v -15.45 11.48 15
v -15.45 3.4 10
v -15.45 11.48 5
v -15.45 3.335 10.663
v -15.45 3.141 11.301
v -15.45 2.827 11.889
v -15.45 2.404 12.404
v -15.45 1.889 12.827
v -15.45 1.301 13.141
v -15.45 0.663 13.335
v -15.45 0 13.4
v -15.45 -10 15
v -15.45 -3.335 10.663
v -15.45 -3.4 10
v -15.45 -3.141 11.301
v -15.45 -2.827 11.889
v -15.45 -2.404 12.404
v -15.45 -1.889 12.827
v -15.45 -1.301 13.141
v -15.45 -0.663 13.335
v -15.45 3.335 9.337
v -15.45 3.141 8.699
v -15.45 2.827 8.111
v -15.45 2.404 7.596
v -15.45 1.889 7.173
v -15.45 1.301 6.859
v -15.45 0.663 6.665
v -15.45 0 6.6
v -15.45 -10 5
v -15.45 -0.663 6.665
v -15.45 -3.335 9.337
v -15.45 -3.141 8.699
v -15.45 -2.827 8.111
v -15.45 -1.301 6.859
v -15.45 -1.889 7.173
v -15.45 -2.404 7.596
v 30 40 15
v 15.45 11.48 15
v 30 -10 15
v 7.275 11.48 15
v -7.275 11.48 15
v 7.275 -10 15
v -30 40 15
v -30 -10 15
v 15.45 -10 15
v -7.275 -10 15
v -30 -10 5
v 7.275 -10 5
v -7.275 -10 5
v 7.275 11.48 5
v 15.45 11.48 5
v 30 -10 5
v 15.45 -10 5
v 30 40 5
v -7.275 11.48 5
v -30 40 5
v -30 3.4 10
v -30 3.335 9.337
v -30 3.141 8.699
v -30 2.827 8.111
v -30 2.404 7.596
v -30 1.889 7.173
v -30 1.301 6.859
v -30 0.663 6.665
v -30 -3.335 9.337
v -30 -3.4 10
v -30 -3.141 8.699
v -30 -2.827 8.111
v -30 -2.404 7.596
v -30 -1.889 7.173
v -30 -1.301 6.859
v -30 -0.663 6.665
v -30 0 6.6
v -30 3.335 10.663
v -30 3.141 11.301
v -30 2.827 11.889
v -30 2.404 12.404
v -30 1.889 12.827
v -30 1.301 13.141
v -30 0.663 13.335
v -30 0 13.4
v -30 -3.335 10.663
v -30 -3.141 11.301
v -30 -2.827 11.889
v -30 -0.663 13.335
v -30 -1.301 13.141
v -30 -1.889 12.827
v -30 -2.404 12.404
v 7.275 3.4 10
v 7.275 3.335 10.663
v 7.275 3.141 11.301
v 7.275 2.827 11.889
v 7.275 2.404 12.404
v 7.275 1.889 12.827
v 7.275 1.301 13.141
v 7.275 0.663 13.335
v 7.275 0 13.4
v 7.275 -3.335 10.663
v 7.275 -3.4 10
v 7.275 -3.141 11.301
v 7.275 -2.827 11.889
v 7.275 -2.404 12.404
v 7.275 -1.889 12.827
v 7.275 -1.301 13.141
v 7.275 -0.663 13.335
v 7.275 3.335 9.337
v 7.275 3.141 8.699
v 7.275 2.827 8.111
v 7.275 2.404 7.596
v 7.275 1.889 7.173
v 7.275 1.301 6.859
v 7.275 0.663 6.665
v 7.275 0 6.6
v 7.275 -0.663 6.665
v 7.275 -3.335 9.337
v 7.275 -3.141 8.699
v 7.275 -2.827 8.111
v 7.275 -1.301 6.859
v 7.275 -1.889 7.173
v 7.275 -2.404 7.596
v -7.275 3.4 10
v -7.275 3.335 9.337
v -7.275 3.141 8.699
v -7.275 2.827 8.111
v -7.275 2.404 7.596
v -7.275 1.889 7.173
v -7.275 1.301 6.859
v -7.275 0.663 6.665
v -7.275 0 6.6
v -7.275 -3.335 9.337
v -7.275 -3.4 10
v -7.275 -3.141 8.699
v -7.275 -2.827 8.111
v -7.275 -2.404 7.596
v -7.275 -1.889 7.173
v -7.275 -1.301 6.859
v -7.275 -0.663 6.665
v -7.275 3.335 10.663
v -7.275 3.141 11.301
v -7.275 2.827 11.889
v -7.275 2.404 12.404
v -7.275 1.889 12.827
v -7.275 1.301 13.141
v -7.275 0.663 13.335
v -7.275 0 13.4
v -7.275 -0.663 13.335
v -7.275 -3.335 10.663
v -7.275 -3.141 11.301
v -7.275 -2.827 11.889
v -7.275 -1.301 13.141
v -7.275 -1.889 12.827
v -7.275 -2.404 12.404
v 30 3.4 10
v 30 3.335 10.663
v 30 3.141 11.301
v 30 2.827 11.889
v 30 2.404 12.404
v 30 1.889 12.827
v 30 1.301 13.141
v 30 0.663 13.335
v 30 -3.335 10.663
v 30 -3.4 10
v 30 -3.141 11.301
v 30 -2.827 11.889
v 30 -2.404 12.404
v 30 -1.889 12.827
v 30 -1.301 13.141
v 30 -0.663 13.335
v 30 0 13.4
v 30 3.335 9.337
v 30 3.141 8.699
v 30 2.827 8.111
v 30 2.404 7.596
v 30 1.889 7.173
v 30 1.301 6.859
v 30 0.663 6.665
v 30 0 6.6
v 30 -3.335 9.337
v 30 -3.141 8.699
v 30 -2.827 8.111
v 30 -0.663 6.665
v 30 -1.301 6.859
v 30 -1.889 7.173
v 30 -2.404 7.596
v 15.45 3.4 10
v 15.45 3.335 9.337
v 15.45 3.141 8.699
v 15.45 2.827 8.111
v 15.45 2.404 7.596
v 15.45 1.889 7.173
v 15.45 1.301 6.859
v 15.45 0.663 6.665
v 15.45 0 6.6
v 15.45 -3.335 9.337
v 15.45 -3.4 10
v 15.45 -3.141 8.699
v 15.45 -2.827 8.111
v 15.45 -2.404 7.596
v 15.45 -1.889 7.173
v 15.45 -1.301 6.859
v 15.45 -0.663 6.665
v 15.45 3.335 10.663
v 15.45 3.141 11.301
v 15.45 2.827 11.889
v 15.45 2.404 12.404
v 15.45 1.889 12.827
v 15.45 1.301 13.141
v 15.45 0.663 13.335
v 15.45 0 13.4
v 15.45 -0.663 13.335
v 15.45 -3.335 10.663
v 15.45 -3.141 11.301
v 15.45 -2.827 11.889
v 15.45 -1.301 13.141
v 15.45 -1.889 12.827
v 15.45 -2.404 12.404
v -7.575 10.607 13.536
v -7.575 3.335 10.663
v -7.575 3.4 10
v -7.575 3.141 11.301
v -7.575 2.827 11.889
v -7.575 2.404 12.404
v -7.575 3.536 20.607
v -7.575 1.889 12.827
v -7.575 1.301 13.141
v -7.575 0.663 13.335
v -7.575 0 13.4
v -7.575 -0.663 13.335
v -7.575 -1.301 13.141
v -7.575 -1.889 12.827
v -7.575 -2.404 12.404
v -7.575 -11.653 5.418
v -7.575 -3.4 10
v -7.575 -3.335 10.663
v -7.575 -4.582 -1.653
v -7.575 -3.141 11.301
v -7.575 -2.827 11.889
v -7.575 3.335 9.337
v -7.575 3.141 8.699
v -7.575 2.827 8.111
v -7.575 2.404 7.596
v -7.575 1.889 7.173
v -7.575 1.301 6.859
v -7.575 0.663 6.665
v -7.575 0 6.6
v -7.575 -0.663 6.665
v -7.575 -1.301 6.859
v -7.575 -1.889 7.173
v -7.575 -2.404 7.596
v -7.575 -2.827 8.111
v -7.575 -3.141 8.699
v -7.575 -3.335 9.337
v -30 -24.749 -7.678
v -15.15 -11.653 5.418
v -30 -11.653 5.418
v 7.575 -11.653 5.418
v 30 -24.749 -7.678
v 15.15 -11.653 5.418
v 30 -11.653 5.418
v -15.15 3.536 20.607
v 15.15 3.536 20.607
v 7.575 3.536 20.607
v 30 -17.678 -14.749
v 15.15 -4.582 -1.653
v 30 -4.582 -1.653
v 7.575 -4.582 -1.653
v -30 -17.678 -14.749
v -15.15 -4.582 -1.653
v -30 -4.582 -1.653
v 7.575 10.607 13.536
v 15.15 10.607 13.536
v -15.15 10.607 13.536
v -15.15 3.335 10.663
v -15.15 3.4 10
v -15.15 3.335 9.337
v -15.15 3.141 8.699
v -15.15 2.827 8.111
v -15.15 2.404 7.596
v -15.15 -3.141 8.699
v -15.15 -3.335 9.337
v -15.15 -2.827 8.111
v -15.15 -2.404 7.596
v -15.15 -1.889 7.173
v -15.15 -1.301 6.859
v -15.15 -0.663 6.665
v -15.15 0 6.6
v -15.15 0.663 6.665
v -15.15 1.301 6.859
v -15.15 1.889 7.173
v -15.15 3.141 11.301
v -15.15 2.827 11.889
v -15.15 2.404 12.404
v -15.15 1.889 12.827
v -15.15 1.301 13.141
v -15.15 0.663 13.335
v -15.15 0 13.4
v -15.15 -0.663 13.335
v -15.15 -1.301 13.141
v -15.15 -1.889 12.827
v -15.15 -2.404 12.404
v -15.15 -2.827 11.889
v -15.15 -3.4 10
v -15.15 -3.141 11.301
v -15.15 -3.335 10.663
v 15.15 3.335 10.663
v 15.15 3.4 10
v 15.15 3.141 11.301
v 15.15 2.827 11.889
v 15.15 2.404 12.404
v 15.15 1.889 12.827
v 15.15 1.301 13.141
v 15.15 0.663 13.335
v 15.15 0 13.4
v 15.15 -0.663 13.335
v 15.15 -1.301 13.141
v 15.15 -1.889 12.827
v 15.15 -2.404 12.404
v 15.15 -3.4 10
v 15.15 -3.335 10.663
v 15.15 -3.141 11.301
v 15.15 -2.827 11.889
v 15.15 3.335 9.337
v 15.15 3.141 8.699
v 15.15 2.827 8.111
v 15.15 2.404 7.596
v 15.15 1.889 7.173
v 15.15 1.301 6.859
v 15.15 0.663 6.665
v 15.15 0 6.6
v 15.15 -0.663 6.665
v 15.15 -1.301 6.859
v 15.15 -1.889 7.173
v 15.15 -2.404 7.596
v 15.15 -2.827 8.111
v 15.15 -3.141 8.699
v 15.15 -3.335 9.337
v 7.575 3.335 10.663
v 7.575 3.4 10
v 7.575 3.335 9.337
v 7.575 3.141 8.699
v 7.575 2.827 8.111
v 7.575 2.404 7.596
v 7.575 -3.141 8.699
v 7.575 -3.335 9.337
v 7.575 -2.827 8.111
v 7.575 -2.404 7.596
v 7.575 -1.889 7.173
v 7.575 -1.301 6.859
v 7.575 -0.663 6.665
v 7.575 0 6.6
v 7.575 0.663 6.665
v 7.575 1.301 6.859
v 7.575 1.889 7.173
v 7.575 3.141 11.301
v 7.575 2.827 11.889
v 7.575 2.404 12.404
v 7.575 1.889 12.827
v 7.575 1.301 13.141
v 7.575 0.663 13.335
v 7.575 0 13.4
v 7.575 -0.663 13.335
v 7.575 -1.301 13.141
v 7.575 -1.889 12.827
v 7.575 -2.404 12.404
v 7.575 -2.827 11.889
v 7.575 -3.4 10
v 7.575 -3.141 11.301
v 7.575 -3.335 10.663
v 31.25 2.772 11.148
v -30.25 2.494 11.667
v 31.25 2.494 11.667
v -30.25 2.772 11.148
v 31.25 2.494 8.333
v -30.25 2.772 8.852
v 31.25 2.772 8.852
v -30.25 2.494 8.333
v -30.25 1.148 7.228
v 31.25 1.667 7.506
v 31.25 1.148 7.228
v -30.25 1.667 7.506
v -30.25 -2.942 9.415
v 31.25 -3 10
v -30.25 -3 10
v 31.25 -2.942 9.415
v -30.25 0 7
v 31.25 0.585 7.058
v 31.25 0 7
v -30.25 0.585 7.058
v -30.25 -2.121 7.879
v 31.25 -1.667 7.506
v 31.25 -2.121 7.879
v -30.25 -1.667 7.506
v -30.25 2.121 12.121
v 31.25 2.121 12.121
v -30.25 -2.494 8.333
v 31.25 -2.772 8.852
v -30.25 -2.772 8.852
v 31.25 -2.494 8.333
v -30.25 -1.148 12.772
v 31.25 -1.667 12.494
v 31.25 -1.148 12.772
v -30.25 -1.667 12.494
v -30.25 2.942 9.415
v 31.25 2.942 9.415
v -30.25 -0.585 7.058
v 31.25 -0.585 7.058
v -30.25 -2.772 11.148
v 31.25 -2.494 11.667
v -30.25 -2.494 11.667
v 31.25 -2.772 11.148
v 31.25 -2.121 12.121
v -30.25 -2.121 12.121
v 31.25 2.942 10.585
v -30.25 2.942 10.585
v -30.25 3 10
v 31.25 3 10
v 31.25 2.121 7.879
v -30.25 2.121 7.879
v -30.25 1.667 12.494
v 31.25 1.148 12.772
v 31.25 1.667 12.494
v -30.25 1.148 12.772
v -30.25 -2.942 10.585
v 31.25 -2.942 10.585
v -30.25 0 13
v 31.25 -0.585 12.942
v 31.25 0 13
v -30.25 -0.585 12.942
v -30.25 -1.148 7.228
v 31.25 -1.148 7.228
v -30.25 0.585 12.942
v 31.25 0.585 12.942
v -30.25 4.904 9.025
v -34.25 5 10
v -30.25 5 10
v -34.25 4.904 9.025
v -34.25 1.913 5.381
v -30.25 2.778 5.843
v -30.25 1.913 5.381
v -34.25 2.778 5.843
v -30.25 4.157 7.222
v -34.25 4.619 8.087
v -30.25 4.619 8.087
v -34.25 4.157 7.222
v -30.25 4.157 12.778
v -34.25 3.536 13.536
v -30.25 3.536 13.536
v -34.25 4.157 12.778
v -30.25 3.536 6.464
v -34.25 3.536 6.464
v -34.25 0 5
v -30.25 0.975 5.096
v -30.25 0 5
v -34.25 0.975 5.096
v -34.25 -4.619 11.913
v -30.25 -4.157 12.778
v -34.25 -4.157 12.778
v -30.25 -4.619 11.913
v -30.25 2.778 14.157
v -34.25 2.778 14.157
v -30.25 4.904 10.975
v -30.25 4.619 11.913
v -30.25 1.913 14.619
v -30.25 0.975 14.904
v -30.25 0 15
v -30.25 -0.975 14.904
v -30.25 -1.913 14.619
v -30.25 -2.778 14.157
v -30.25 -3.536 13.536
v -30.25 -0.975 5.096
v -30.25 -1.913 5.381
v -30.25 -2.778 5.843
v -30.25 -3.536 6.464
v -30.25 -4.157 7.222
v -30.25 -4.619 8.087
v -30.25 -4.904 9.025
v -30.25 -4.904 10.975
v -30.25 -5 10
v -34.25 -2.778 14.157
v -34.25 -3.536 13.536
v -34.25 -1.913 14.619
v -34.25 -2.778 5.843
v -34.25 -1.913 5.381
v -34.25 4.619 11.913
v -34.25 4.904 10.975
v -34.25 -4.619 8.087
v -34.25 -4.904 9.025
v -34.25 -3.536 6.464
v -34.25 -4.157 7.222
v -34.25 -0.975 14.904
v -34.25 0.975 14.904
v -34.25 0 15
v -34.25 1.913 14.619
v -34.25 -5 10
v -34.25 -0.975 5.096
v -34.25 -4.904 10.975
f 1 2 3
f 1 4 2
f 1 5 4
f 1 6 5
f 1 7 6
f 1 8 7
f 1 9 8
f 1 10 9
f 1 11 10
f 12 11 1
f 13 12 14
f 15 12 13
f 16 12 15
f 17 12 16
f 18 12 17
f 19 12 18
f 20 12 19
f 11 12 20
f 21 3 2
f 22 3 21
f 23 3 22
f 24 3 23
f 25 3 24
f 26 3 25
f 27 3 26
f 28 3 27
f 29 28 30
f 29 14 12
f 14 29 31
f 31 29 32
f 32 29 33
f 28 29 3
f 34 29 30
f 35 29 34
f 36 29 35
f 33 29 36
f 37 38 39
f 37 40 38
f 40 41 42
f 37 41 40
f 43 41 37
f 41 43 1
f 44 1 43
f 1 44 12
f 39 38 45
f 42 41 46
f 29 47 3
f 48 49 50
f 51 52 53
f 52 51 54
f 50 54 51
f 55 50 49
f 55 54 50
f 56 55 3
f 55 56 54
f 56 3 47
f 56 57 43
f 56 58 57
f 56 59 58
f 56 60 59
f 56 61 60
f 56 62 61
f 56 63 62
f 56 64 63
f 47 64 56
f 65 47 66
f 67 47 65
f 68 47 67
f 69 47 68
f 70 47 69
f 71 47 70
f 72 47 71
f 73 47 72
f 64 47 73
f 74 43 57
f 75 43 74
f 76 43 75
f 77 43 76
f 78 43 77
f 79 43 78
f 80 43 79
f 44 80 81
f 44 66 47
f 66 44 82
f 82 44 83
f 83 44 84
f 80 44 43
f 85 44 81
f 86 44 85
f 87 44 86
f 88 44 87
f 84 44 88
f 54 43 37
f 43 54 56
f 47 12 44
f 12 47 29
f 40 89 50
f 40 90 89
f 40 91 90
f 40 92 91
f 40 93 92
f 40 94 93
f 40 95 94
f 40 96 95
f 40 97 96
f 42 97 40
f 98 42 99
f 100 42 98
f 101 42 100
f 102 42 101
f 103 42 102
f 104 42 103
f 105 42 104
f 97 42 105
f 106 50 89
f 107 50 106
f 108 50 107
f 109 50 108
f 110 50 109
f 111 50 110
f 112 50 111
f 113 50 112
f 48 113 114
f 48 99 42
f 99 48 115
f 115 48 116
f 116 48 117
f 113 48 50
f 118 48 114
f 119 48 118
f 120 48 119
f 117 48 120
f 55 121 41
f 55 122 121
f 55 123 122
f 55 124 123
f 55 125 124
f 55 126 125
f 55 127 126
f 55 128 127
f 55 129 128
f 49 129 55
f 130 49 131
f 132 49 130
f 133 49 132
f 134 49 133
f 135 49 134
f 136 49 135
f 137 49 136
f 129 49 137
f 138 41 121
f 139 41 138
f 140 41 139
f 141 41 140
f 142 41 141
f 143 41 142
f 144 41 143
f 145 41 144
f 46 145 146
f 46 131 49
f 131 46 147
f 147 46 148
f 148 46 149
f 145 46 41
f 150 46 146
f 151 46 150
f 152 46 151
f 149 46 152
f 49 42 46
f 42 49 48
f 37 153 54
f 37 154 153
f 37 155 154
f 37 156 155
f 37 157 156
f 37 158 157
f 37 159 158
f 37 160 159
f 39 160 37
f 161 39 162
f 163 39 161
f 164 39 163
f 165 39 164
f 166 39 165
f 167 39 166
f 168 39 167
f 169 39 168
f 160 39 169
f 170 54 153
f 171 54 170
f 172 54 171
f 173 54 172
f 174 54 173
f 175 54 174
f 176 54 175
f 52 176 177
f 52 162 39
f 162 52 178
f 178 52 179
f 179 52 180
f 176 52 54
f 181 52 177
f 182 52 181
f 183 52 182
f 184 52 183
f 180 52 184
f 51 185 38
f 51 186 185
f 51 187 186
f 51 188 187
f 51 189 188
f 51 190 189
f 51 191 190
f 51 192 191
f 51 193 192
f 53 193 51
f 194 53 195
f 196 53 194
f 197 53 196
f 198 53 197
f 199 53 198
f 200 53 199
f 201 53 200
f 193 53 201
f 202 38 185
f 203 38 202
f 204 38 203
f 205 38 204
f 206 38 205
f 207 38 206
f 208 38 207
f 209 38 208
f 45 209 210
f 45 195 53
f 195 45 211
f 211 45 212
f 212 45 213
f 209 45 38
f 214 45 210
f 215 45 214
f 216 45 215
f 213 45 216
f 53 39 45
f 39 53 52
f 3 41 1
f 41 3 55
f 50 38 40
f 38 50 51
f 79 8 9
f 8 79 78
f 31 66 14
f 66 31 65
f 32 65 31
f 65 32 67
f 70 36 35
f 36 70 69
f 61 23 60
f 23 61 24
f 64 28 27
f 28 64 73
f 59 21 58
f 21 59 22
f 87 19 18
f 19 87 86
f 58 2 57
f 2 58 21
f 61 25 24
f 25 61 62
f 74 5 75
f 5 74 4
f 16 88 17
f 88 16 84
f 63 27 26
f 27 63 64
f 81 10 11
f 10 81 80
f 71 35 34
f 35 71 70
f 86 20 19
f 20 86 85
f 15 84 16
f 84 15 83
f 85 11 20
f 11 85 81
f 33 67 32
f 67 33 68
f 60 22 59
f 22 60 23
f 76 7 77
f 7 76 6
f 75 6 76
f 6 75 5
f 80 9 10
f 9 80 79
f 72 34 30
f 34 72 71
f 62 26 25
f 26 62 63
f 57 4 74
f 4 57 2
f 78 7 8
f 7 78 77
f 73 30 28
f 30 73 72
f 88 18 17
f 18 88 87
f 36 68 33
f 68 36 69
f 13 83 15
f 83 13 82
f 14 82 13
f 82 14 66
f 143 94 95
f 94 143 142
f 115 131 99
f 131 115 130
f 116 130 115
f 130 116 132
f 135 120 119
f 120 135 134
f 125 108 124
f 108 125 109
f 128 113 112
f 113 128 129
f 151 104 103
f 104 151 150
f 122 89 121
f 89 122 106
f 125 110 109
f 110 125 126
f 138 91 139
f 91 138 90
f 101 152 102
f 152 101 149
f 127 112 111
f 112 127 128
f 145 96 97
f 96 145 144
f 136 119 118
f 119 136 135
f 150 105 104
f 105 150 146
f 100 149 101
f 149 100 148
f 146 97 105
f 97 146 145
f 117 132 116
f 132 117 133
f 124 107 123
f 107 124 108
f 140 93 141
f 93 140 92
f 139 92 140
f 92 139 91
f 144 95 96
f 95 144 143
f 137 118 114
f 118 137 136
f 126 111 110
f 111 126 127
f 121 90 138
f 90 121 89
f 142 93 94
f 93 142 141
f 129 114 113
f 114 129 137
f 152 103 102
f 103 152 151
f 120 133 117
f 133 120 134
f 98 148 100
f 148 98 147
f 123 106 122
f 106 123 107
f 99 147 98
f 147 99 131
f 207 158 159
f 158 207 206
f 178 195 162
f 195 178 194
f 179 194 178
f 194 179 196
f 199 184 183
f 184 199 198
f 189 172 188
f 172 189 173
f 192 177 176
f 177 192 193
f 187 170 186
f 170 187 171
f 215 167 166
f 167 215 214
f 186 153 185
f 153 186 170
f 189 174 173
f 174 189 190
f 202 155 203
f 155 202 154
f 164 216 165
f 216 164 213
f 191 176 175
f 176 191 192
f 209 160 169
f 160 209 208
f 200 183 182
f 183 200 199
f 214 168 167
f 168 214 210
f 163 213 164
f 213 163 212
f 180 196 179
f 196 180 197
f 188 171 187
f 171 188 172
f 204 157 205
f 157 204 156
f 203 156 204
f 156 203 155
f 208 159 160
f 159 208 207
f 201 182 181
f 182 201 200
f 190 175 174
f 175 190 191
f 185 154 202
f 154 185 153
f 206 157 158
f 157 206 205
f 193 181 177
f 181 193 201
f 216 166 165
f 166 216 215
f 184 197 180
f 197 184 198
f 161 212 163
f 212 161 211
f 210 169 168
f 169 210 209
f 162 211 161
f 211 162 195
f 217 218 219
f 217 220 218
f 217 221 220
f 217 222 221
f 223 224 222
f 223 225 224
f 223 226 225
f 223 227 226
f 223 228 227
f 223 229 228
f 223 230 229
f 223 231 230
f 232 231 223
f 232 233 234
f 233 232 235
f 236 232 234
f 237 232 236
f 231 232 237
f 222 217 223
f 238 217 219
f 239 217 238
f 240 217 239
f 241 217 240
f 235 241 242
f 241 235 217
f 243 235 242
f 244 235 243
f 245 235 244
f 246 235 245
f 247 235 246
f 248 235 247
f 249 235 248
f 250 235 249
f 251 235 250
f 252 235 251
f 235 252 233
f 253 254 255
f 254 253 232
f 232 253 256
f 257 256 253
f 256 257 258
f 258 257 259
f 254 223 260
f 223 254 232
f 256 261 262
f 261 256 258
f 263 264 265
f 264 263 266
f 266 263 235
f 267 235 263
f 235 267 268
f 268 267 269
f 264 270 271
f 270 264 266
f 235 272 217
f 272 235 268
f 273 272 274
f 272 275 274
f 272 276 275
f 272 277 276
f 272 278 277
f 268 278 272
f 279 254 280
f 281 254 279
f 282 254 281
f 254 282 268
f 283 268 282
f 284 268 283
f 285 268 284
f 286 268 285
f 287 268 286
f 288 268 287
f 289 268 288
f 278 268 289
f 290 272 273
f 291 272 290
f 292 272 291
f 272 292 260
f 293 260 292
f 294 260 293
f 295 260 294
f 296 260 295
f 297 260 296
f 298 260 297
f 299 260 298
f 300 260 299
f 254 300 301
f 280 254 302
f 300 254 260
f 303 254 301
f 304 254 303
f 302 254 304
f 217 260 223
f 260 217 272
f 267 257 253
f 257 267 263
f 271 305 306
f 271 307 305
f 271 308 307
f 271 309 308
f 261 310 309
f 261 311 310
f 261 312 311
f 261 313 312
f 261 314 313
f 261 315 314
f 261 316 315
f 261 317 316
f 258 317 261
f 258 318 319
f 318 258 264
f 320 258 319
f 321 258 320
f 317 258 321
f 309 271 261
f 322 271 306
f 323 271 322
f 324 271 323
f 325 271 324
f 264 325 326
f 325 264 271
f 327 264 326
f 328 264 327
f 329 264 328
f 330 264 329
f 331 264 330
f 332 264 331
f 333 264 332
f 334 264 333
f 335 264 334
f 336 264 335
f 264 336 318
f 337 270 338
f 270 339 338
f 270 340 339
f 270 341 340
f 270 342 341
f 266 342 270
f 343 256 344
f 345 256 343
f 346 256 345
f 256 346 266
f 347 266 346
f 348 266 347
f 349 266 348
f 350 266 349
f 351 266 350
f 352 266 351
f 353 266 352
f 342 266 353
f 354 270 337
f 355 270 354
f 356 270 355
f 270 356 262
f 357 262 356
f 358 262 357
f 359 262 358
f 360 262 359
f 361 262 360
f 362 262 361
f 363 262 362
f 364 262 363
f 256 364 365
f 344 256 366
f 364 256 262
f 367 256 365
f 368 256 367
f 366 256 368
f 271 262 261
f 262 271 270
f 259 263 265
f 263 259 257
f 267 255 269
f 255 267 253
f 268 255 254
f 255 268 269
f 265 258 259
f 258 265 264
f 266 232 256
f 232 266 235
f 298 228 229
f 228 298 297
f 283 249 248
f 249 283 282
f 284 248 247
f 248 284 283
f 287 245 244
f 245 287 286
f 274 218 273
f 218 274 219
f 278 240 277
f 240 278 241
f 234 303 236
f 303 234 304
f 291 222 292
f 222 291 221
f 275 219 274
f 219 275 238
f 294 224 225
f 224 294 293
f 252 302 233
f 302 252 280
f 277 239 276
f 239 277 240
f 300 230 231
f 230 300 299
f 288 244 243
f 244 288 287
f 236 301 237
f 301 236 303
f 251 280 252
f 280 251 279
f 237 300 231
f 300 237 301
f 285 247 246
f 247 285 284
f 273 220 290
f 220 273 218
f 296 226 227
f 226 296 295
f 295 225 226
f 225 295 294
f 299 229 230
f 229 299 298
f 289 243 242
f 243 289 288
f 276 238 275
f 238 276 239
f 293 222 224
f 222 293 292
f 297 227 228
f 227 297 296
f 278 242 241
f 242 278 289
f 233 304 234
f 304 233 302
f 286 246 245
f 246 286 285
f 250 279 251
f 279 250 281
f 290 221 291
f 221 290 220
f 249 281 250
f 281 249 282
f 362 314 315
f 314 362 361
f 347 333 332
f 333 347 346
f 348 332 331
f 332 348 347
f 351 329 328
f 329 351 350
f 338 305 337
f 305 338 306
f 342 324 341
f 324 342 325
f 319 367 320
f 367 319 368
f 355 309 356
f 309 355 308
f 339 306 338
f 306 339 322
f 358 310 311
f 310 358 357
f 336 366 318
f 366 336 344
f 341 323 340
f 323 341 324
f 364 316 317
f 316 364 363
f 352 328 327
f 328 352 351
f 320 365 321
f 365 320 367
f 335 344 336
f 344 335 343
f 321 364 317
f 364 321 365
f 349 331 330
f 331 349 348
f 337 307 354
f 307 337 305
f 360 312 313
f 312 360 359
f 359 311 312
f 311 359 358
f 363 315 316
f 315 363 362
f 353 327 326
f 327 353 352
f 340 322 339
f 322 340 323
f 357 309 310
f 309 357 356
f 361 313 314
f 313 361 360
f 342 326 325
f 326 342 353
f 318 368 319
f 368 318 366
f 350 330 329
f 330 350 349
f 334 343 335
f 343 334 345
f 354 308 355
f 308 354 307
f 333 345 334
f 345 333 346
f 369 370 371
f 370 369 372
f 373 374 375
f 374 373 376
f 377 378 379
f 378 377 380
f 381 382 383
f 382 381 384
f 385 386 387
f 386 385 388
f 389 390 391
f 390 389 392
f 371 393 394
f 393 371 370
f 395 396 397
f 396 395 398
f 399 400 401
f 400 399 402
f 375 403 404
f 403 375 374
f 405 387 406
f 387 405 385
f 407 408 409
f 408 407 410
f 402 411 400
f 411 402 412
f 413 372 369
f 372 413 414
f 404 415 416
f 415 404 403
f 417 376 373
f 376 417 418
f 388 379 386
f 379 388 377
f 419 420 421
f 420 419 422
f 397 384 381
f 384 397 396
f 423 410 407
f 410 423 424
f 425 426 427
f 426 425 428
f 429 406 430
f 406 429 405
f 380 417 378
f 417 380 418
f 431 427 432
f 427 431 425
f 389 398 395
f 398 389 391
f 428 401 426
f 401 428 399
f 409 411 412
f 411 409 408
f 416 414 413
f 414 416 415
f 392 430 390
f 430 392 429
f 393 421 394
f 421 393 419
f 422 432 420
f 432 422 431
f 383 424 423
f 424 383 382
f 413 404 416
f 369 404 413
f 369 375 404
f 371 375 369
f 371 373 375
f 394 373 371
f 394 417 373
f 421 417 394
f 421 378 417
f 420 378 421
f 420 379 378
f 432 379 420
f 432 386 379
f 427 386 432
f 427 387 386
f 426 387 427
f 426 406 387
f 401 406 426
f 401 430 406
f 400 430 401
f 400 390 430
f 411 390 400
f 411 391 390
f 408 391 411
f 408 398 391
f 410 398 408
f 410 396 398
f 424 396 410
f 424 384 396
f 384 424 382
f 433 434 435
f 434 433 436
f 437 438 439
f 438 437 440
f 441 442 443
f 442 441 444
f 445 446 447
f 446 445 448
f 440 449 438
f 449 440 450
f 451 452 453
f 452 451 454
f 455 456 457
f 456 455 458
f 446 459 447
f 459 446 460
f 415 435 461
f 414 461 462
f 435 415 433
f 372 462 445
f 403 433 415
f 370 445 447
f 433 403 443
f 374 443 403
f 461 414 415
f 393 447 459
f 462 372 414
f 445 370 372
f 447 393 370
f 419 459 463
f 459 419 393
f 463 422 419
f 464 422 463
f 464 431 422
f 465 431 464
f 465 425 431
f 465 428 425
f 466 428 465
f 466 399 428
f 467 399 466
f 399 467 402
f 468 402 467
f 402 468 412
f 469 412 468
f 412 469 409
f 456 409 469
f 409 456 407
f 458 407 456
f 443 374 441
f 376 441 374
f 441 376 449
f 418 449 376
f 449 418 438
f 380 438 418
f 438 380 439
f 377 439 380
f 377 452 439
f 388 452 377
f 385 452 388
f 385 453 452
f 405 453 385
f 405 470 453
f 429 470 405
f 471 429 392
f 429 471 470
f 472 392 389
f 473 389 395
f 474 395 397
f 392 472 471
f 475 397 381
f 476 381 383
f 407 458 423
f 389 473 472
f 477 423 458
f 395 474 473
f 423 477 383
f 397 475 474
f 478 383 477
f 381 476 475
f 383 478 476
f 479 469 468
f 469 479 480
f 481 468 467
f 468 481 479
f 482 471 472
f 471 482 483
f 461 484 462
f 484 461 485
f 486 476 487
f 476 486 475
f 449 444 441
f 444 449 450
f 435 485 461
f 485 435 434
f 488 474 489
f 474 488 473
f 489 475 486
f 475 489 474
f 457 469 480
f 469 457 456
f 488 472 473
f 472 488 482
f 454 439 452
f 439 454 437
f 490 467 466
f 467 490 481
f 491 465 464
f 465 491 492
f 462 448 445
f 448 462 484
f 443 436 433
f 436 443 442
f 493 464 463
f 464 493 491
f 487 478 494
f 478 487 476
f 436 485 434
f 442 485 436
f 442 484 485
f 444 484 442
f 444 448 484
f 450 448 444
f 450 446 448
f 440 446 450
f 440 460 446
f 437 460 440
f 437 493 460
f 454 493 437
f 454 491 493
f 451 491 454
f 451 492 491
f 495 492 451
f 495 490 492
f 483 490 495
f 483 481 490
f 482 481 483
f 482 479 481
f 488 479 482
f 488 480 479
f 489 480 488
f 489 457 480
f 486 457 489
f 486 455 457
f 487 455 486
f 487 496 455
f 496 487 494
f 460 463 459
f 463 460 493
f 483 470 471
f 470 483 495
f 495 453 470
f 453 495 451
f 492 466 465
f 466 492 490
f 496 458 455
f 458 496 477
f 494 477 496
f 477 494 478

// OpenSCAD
$fn = 32;

// ------------------------------------------------------------------------
// Butt hinge: hinge 60 mm, leaf swung 45 deg
// Every part is its own module, assembly() places every instance.
// ------------------------------------------------------------------------

// --- part 1 ---
module hinge_base() {
  difference() {
    union() {
      translate([-30, -10, -5]) cube([14.55, 50, 10]);
      translate([-7.275, -10, -5]) cube([14.55, 50, 10]);
      translate([15.45, -10, -5]) cube([14.55, 50, 10]);
      translate([-30, 11.48, -5]) cube([60, 28.52, 10]);
    }
    translate([-22.725, 0, 0]) rotate([0, 90, 0]) cylinder(h = 16.55, d = 6.8, center = true);
    translate([0, 0, 0]) rotate([0, 90, 0]) cylinder(h = 16.55, d = 6.8, center = true);
    translate([22.725, 0, 0]) rotate([0, 90, 0]) cylinder(h = 16.55, d = 6.8, center = true);
  }
}

// --- part 2 ---
module hinge_mover() {
  difference() {
    union() {
      translate([-15.15, -30, -5]) cube([7.575, 40, 10]);
      translate([7.575, -30, -5]) cube([7.575, 40, 10]);
      translate([-30, -30, -5]) cube([60, 18.52, 10]);
    }
    translate([-11.362, 0, 0]) rotate([0, 90, 0]) cylinder(h = 9.575, d = 6.8, center = true);
    translate([11.362, 0, 0]) rotate([0, 90, 0]) cylinder(h = 9.575, d = 6.8, center = true);
  }
}

// --- part 3 ---
module hinge_pin() {
  rotate([0, 90, 0]) cylinder(h = 62.5, d = 6, center = true);
  translate([-34.25, 0, 0]) rotate([0, 90, 0]) cylinder(h = 4, d = 10);
}

// --- assembly ---
module assembly() {
  color([0.80, 0.24, 0.20]) translate([0, 0, 10]) rotate([0, 0, 0]) hinge_base();
  color([0.20, 0.45, 0.75]) translate([0, 0, 10]) rotate([45, 0, 0]) hinge_mover();
  color([0.25, 0.62, 0.32]) translate([0, 0, 10]) rotate([0, 0, 0]) hinge_pin();
}

assembly();
